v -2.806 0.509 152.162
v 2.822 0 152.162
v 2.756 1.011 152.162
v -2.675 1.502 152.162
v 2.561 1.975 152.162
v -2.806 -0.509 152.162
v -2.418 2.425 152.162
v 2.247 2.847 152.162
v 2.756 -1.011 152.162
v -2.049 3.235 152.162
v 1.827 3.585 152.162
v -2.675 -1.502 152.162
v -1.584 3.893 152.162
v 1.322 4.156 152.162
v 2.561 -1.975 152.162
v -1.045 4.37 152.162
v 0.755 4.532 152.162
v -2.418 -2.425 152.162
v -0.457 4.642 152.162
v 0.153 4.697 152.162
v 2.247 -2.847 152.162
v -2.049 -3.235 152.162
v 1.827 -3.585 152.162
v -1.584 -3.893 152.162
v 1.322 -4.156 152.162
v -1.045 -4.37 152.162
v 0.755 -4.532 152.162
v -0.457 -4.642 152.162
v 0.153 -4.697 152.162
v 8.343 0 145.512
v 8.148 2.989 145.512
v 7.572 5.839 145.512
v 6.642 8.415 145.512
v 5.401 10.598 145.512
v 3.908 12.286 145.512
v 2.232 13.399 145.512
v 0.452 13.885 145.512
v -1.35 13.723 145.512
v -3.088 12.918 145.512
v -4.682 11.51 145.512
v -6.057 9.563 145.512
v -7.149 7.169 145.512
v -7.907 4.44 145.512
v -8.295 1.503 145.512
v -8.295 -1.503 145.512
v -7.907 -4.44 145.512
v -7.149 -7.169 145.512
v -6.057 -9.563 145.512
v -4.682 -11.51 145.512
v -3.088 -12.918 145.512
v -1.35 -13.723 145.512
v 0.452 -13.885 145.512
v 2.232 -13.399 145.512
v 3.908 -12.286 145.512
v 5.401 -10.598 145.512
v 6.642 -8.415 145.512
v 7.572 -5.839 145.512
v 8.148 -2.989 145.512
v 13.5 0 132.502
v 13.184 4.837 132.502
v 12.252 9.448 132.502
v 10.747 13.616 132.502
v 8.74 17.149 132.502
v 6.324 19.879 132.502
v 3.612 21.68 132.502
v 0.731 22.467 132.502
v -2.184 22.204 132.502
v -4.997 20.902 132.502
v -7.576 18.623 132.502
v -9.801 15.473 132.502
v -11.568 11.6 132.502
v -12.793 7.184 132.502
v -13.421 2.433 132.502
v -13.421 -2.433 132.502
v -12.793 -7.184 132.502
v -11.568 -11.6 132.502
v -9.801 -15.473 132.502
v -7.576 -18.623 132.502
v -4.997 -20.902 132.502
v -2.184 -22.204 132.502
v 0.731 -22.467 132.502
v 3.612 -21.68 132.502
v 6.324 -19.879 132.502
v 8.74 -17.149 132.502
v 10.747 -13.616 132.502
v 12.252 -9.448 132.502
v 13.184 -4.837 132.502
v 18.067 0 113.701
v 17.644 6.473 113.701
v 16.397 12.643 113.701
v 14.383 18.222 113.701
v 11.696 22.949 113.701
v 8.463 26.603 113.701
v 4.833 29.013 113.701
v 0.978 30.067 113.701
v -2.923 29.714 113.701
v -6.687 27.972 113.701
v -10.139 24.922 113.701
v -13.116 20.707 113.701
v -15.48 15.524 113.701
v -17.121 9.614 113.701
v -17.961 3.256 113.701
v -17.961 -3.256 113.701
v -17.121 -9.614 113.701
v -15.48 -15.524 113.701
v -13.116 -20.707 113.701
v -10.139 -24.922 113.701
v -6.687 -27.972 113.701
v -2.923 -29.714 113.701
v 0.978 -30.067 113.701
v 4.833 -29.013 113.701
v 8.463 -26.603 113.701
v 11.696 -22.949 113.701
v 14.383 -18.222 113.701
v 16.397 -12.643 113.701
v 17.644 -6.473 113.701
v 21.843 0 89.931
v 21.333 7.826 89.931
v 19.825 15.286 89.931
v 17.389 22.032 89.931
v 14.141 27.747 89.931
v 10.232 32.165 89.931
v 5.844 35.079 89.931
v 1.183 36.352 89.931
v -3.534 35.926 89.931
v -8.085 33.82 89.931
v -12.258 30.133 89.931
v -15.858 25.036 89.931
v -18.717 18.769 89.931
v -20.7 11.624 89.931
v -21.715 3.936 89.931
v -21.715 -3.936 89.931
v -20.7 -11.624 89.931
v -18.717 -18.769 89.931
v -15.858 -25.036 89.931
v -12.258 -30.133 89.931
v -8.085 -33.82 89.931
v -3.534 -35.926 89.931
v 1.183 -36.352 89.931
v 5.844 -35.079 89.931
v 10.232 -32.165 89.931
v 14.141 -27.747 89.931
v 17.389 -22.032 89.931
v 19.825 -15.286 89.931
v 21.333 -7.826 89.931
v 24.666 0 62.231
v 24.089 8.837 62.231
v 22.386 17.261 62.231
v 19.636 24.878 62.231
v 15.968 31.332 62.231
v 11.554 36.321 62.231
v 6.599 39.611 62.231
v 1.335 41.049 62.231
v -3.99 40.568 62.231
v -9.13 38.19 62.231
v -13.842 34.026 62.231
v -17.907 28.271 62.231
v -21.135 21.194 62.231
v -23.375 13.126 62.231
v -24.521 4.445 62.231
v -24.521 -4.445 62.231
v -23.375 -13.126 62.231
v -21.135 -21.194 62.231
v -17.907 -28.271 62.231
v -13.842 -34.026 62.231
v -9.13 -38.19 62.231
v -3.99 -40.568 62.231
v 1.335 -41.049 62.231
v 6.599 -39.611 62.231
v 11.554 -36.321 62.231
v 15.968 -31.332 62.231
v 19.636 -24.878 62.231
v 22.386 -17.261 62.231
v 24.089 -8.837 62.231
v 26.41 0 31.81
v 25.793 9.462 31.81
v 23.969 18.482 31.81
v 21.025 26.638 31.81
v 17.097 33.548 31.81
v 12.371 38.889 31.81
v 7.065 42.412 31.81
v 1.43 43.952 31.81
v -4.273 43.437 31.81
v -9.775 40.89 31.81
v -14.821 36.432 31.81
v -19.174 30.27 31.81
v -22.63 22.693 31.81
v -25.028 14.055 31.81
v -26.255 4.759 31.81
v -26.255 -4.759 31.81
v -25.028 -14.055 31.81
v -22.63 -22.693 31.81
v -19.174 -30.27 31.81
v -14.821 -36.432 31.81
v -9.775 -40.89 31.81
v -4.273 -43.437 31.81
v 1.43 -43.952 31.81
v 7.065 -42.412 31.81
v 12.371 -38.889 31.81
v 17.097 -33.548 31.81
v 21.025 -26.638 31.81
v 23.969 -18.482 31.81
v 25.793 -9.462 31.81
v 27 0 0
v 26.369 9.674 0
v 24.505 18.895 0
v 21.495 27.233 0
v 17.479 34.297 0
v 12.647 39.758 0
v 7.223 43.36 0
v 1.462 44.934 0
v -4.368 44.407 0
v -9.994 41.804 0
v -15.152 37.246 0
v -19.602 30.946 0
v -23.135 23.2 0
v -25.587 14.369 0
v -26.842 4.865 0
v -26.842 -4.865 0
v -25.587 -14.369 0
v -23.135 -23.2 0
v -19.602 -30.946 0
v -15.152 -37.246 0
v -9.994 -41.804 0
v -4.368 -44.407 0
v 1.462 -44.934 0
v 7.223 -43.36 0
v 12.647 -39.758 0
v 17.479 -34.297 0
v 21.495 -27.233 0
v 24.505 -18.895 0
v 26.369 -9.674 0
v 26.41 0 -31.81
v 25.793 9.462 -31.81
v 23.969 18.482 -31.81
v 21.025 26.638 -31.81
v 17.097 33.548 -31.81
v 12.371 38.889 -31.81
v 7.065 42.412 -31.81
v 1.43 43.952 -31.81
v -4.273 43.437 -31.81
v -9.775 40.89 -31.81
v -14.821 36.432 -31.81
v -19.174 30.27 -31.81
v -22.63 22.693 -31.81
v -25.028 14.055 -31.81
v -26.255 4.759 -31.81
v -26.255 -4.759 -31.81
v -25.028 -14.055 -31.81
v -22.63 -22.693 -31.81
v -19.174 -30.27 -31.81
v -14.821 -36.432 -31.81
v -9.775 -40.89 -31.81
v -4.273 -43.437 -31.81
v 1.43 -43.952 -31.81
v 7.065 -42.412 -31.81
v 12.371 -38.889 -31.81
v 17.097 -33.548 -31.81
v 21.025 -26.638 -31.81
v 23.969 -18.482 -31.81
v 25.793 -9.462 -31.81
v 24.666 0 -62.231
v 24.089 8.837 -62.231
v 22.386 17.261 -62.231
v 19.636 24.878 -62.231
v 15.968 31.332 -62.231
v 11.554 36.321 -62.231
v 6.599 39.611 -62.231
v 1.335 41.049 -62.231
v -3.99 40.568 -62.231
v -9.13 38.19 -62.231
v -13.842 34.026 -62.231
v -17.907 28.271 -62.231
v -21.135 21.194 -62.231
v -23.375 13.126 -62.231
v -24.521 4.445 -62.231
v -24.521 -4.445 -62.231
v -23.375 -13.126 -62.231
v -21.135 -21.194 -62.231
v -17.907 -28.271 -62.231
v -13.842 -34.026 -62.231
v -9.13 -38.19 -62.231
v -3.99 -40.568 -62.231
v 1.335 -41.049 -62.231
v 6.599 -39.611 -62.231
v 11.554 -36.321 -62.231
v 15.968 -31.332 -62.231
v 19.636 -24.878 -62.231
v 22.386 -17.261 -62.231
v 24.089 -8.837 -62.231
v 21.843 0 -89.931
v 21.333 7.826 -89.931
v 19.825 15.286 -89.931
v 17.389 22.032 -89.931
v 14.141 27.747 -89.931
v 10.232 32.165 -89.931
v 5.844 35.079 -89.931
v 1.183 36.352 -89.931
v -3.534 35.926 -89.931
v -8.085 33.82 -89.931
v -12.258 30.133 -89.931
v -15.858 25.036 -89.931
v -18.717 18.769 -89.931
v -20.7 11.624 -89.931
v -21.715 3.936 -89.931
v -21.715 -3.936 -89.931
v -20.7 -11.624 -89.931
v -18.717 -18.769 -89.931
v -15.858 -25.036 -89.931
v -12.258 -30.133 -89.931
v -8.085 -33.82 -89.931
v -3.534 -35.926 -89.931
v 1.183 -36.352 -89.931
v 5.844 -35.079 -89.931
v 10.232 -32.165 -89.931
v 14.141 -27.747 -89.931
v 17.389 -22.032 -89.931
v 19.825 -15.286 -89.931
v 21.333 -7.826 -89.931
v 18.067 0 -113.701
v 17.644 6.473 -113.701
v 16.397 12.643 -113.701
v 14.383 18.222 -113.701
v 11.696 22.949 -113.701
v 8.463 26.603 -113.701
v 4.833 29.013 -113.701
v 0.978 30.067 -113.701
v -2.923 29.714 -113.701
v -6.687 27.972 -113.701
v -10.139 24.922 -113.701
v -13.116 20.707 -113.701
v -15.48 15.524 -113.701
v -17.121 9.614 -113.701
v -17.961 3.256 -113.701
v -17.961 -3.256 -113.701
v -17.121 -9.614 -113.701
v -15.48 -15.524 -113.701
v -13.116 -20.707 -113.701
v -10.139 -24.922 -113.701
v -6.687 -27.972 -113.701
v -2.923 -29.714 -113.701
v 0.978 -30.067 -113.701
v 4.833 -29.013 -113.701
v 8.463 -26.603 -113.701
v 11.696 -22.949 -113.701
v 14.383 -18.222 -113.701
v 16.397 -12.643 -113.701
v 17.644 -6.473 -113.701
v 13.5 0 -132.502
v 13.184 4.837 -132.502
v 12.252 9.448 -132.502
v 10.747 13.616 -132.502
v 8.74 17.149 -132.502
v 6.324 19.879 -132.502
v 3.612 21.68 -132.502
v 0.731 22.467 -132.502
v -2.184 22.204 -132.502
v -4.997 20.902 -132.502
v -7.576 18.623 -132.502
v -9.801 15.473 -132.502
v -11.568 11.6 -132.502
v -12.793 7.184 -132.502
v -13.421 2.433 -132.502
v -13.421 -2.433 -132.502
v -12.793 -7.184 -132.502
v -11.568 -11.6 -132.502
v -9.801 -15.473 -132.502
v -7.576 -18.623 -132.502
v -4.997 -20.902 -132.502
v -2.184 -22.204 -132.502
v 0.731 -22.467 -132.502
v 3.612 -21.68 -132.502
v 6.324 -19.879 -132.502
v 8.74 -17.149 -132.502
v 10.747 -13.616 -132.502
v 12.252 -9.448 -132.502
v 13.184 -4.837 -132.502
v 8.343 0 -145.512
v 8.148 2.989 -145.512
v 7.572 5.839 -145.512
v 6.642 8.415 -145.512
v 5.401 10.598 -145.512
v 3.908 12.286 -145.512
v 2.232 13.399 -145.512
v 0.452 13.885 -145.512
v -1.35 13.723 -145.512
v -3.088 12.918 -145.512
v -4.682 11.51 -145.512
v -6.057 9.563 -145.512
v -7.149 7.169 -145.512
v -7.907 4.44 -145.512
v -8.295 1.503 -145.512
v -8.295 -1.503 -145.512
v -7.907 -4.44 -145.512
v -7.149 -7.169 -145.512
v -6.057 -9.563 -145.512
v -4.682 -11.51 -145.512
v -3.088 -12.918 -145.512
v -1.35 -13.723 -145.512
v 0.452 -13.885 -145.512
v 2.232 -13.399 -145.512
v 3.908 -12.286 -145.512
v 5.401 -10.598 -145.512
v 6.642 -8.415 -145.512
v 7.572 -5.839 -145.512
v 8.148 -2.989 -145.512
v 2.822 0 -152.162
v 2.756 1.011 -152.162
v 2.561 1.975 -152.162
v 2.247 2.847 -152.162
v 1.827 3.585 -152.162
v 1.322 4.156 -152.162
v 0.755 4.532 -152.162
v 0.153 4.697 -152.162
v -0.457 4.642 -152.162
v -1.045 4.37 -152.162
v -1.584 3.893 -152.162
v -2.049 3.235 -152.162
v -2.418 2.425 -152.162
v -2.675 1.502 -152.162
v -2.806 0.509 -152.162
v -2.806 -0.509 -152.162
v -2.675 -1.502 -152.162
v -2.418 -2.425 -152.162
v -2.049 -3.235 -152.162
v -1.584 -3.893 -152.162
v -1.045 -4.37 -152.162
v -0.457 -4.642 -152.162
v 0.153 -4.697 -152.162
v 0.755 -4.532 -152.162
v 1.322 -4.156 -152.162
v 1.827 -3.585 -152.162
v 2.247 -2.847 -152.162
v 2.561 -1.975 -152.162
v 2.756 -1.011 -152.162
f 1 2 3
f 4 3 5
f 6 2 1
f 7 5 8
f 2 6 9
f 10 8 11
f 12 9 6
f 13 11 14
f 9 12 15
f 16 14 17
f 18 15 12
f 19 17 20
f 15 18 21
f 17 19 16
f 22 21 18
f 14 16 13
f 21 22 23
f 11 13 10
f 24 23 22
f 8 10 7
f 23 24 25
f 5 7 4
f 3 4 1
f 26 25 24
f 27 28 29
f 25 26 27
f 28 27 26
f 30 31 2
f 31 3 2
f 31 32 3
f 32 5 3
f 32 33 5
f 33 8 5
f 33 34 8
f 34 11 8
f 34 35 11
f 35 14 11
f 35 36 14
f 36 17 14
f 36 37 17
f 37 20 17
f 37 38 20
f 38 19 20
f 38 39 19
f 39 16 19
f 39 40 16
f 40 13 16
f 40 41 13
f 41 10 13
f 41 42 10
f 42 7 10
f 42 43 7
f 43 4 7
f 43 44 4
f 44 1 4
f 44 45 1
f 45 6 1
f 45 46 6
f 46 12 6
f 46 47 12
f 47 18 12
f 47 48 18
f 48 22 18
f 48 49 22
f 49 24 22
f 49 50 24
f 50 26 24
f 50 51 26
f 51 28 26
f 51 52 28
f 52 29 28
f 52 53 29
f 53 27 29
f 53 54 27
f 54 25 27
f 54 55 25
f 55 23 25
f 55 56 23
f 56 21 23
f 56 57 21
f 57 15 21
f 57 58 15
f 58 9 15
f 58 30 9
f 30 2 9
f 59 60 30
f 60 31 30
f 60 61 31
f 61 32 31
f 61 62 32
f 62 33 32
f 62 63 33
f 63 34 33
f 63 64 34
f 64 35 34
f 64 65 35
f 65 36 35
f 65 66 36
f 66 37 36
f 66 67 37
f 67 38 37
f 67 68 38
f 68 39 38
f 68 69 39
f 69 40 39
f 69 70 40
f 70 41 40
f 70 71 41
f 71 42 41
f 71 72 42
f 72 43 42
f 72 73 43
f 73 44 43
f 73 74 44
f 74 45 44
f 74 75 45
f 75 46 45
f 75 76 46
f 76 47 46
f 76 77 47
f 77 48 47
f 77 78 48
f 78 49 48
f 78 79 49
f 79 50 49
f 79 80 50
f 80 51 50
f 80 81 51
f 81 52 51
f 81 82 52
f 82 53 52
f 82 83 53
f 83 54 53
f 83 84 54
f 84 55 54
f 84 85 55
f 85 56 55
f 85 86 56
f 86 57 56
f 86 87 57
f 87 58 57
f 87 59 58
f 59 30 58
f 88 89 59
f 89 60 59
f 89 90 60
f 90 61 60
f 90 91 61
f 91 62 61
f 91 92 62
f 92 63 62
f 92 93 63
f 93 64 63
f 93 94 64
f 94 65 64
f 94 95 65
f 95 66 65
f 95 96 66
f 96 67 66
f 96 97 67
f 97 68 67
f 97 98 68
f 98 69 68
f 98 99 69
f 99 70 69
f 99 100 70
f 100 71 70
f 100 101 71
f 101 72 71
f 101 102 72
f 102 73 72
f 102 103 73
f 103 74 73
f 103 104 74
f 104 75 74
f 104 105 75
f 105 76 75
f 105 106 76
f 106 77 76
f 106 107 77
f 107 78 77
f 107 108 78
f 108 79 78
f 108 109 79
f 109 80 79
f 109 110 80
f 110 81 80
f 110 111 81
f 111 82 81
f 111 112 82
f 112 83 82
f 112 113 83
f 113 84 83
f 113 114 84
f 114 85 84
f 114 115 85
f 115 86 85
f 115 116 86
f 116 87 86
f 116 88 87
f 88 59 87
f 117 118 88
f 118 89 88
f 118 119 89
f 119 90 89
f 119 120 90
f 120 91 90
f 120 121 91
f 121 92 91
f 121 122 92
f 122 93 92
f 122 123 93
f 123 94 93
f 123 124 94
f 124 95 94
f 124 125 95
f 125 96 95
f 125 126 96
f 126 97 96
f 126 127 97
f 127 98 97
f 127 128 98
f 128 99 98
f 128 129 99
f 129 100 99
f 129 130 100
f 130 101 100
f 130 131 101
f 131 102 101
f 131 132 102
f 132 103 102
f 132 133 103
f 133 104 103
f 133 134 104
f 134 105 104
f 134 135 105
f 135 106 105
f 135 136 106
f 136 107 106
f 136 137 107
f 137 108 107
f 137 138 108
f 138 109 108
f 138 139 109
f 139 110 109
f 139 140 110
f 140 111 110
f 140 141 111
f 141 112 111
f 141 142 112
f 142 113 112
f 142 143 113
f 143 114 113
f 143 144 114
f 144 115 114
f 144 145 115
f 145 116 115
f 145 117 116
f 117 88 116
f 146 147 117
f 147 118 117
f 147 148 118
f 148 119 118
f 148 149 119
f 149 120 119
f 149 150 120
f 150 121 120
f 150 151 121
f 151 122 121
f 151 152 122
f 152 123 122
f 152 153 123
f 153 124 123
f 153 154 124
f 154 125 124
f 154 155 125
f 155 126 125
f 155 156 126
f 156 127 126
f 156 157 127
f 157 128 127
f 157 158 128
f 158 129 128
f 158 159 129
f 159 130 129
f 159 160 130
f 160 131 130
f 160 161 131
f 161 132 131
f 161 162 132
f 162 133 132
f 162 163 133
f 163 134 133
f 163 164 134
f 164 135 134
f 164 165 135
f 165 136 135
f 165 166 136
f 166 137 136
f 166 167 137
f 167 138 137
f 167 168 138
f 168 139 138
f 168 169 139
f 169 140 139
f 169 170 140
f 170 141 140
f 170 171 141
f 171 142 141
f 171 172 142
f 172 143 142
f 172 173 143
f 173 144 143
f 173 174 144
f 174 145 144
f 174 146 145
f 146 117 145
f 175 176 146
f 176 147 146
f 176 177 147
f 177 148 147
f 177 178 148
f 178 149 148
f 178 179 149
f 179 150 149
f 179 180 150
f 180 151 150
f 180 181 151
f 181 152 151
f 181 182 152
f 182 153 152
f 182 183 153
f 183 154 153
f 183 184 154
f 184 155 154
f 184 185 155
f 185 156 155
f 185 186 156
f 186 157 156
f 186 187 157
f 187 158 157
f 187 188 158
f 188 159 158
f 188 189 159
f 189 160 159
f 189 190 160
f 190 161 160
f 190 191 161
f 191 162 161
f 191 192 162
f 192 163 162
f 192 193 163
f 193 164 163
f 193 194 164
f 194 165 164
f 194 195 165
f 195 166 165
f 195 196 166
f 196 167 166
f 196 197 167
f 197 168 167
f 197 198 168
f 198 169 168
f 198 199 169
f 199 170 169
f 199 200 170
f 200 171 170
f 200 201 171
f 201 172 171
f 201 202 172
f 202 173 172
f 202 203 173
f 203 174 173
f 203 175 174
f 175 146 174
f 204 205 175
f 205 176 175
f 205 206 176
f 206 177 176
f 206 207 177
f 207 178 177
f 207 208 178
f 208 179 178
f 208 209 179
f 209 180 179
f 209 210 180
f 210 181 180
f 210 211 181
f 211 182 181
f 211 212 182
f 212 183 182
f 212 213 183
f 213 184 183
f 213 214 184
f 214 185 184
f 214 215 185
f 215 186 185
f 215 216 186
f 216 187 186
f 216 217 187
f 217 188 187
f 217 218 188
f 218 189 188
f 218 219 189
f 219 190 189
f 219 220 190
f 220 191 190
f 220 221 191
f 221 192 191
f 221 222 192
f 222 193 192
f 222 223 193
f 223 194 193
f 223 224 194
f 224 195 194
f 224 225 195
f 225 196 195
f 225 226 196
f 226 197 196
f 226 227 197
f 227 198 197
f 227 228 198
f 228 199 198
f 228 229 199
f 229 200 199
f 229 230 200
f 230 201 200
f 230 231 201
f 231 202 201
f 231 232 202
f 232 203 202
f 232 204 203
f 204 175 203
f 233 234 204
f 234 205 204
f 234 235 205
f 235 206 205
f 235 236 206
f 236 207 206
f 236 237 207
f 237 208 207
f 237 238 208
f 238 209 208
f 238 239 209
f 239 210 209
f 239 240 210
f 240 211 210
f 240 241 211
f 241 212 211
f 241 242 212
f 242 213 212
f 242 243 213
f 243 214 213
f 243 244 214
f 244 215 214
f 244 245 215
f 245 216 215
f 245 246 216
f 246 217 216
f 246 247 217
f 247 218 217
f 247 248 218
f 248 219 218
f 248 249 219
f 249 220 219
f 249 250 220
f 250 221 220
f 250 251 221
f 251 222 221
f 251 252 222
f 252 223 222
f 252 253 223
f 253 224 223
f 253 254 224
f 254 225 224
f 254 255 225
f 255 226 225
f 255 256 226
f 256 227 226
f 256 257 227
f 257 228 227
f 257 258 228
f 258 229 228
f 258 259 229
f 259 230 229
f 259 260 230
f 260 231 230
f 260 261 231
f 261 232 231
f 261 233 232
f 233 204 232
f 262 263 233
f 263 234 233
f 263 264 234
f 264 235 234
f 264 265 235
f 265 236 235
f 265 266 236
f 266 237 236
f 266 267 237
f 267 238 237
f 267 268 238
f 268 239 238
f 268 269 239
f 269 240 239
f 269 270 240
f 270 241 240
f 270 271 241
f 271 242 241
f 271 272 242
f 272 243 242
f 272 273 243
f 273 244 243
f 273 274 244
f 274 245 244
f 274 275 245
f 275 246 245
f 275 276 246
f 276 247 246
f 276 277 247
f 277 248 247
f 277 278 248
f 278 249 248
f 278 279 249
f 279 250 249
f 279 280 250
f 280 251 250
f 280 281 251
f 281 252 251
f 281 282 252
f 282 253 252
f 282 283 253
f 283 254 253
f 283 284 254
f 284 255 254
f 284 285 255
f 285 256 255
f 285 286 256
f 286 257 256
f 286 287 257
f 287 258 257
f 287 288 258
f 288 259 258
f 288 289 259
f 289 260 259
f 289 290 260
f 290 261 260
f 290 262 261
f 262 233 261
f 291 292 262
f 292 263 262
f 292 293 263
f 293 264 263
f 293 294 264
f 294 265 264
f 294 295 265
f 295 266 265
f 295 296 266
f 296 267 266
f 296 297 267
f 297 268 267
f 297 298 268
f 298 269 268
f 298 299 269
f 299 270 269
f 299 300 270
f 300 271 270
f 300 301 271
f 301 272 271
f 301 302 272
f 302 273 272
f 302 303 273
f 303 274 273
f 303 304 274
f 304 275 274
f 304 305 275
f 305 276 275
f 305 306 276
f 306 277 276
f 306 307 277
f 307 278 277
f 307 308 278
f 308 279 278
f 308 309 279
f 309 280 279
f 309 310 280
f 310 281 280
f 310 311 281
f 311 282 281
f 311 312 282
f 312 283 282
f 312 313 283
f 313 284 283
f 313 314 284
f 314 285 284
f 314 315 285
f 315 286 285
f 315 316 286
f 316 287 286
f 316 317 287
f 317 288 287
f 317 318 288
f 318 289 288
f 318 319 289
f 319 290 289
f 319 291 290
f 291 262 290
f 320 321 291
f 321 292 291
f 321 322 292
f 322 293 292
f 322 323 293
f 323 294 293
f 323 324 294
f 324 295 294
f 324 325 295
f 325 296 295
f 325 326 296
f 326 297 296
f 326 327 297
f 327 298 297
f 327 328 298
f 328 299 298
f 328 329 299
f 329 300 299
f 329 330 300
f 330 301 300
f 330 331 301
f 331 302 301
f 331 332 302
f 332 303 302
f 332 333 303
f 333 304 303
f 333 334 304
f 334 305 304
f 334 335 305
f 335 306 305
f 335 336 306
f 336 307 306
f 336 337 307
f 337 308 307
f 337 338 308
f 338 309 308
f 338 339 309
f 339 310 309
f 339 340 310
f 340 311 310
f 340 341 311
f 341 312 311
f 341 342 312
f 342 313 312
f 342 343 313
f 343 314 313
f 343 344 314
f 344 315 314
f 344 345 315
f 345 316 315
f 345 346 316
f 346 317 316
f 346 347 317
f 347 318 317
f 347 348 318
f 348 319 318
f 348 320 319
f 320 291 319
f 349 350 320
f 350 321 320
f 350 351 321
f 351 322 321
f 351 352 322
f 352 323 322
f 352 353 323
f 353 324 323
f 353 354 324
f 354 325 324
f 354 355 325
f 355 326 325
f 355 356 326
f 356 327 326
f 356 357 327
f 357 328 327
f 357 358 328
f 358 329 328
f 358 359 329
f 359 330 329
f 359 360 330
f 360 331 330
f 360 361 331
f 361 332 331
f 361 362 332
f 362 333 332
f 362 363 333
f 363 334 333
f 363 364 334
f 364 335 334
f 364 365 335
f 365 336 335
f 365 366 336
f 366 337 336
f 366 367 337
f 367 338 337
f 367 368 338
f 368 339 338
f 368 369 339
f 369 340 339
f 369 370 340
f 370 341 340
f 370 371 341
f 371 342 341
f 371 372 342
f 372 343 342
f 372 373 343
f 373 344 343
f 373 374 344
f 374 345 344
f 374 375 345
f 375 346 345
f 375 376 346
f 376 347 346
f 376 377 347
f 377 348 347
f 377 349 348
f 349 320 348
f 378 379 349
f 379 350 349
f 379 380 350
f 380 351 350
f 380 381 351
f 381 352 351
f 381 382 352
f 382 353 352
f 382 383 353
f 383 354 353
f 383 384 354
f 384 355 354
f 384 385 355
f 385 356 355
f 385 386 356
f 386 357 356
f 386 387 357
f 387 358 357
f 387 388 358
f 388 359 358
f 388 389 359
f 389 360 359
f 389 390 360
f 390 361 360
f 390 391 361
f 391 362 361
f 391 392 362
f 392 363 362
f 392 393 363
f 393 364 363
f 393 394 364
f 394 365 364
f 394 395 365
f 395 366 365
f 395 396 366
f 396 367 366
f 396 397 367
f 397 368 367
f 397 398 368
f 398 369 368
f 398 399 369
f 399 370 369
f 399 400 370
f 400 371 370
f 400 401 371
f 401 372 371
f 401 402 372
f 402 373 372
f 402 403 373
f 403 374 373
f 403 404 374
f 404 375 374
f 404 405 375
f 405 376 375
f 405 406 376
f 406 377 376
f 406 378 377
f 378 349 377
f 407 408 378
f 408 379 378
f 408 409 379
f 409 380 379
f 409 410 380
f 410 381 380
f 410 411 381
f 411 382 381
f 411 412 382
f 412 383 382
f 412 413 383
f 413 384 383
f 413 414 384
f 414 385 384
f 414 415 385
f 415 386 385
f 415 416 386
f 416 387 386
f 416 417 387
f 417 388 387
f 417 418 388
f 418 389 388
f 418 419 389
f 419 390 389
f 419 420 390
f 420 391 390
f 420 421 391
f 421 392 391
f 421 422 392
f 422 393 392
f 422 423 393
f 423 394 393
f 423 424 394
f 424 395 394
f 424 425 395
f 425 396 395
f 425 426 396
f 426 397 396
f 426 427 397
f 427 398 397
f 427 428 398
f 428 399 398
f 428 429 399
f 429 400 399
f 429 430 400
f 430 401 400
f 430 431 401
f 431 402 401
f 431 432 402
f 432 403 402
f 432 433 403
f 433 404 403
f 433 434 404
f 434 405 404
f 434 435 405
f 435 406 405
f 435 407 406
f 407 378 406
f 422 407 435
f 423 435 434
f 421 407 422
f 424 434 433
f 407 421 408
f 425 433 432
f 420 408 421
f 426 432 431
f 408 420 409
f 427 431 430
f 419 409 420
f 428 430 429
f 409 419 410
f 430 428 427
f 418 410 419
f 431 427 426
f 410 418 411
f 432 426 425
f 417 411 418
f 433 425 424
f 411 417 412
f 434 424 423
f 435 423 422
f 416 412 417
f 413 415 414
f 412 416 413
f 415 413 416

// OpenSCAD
// Generated by SolidPython 1.0.1 on 2020-07-29 00:46:45


scale(v = [3, 5, 17]) {
	sphere(r = 9);
}
/***********************************************
*********      SolidPython code:      **********
************************************************
 
# import packages: SolidPython
from solid import *
from solid.utils import *
from itertools import chain, combinations, permutations


class Resize:

    def __init__(self, scad_file):
        self.scad_file = scad_file
        #self.scad_file = import_scad(scad_file)
        # cone/cylinder param:
        self.r1 = 0
        self.r2 = 0
        self.h = 0
        # rectangular prism param:
        self.w = 0
        self.l = 0
        # ellipse param:
        self.r = 0

    # import OpenScad code (file name corresponds to shape)


    # classify shape + parameters
    def assign(self, param1, param2, param3):
        if self.scad_file == 'cone.scad':
            self.r1 = param1
            self.r2 = param2
            self.h = param3
        elif self.scad_file == 'cylinder.scad':
            self.r1 = param1
            self.r2 = param2
            self.h = param3
        elif self.scad_file == 'rectangularPrism.scad':
            self.h = param1
            self.l = param2
            self.w = param3
        else:
            self.r = param1
            self.h = param2

    # resize parameters
    def iterate(self):
        x = range(3, 20, 2)
        i = 1
        if self.scad_file == 'cone.scad':
            tempList = list(permutations(x, 2))
            for temp in tempList:
                param1 = temp[0]
                param2 = temp[1]
                filepath = 'produced_scad_files/' + 'cone' + str(param1) + '_' + str(param2) + '_' + '.scad'
                scad_render_to_file(cylinder(h=param1, r1=param2, r2=0), filepath)

        elif self.scad_file == 'cylinder.scad':
            tempList = list(permutations(x, 3))
            for temp in tempList:
                param1 = temp[0]
                param2 = temp[1]
                filepath = 'produced_scad_files/' + 'cylinder' + str(param1) + '_' + str(param2) + '_' + '.scad'
                scad_render_to_file(cylinder(h=param1, r1=param2, r2=param2), filepath)

        elif self.scad_file == 'rectangularPrism.scad':
            tempList = list(permutations(x, 3))
            for temp in tempList:
                param1 = temp[0]
                param2 = temp[1]
                param3 = temp[2]
                filepath = 'produced_scad_files/' + 'rectangularPrism' + str(param1) + '_' + str(param2) + '_' + str(
                    param3) + '.scad'
                scad_render_to_file(cube(size=(param1, param2, param3)), filepath)

        elif self.scad_file == 'ellipse.scad':
            tempList = list(permutations(x, 4))
            for temp in tempList:
                param1 = temp[0]
                param2 = temp[1]
                param3 = temp[2]
                param4 = temp[3]
                filepath = 'produced_scad_files/' + 'ellipse' + str(param1) + '_' + str(param2) + '_' + str(param3) + '_' + str(param4) + '.scad'
                scad_render_to_file(scale([param1, param2, param3])(sphere(r=param4)), filepath)

    def render_to_scadfile(self):
        scad_render_to_file(scad, 'example.scad') 
 
************************************************/
